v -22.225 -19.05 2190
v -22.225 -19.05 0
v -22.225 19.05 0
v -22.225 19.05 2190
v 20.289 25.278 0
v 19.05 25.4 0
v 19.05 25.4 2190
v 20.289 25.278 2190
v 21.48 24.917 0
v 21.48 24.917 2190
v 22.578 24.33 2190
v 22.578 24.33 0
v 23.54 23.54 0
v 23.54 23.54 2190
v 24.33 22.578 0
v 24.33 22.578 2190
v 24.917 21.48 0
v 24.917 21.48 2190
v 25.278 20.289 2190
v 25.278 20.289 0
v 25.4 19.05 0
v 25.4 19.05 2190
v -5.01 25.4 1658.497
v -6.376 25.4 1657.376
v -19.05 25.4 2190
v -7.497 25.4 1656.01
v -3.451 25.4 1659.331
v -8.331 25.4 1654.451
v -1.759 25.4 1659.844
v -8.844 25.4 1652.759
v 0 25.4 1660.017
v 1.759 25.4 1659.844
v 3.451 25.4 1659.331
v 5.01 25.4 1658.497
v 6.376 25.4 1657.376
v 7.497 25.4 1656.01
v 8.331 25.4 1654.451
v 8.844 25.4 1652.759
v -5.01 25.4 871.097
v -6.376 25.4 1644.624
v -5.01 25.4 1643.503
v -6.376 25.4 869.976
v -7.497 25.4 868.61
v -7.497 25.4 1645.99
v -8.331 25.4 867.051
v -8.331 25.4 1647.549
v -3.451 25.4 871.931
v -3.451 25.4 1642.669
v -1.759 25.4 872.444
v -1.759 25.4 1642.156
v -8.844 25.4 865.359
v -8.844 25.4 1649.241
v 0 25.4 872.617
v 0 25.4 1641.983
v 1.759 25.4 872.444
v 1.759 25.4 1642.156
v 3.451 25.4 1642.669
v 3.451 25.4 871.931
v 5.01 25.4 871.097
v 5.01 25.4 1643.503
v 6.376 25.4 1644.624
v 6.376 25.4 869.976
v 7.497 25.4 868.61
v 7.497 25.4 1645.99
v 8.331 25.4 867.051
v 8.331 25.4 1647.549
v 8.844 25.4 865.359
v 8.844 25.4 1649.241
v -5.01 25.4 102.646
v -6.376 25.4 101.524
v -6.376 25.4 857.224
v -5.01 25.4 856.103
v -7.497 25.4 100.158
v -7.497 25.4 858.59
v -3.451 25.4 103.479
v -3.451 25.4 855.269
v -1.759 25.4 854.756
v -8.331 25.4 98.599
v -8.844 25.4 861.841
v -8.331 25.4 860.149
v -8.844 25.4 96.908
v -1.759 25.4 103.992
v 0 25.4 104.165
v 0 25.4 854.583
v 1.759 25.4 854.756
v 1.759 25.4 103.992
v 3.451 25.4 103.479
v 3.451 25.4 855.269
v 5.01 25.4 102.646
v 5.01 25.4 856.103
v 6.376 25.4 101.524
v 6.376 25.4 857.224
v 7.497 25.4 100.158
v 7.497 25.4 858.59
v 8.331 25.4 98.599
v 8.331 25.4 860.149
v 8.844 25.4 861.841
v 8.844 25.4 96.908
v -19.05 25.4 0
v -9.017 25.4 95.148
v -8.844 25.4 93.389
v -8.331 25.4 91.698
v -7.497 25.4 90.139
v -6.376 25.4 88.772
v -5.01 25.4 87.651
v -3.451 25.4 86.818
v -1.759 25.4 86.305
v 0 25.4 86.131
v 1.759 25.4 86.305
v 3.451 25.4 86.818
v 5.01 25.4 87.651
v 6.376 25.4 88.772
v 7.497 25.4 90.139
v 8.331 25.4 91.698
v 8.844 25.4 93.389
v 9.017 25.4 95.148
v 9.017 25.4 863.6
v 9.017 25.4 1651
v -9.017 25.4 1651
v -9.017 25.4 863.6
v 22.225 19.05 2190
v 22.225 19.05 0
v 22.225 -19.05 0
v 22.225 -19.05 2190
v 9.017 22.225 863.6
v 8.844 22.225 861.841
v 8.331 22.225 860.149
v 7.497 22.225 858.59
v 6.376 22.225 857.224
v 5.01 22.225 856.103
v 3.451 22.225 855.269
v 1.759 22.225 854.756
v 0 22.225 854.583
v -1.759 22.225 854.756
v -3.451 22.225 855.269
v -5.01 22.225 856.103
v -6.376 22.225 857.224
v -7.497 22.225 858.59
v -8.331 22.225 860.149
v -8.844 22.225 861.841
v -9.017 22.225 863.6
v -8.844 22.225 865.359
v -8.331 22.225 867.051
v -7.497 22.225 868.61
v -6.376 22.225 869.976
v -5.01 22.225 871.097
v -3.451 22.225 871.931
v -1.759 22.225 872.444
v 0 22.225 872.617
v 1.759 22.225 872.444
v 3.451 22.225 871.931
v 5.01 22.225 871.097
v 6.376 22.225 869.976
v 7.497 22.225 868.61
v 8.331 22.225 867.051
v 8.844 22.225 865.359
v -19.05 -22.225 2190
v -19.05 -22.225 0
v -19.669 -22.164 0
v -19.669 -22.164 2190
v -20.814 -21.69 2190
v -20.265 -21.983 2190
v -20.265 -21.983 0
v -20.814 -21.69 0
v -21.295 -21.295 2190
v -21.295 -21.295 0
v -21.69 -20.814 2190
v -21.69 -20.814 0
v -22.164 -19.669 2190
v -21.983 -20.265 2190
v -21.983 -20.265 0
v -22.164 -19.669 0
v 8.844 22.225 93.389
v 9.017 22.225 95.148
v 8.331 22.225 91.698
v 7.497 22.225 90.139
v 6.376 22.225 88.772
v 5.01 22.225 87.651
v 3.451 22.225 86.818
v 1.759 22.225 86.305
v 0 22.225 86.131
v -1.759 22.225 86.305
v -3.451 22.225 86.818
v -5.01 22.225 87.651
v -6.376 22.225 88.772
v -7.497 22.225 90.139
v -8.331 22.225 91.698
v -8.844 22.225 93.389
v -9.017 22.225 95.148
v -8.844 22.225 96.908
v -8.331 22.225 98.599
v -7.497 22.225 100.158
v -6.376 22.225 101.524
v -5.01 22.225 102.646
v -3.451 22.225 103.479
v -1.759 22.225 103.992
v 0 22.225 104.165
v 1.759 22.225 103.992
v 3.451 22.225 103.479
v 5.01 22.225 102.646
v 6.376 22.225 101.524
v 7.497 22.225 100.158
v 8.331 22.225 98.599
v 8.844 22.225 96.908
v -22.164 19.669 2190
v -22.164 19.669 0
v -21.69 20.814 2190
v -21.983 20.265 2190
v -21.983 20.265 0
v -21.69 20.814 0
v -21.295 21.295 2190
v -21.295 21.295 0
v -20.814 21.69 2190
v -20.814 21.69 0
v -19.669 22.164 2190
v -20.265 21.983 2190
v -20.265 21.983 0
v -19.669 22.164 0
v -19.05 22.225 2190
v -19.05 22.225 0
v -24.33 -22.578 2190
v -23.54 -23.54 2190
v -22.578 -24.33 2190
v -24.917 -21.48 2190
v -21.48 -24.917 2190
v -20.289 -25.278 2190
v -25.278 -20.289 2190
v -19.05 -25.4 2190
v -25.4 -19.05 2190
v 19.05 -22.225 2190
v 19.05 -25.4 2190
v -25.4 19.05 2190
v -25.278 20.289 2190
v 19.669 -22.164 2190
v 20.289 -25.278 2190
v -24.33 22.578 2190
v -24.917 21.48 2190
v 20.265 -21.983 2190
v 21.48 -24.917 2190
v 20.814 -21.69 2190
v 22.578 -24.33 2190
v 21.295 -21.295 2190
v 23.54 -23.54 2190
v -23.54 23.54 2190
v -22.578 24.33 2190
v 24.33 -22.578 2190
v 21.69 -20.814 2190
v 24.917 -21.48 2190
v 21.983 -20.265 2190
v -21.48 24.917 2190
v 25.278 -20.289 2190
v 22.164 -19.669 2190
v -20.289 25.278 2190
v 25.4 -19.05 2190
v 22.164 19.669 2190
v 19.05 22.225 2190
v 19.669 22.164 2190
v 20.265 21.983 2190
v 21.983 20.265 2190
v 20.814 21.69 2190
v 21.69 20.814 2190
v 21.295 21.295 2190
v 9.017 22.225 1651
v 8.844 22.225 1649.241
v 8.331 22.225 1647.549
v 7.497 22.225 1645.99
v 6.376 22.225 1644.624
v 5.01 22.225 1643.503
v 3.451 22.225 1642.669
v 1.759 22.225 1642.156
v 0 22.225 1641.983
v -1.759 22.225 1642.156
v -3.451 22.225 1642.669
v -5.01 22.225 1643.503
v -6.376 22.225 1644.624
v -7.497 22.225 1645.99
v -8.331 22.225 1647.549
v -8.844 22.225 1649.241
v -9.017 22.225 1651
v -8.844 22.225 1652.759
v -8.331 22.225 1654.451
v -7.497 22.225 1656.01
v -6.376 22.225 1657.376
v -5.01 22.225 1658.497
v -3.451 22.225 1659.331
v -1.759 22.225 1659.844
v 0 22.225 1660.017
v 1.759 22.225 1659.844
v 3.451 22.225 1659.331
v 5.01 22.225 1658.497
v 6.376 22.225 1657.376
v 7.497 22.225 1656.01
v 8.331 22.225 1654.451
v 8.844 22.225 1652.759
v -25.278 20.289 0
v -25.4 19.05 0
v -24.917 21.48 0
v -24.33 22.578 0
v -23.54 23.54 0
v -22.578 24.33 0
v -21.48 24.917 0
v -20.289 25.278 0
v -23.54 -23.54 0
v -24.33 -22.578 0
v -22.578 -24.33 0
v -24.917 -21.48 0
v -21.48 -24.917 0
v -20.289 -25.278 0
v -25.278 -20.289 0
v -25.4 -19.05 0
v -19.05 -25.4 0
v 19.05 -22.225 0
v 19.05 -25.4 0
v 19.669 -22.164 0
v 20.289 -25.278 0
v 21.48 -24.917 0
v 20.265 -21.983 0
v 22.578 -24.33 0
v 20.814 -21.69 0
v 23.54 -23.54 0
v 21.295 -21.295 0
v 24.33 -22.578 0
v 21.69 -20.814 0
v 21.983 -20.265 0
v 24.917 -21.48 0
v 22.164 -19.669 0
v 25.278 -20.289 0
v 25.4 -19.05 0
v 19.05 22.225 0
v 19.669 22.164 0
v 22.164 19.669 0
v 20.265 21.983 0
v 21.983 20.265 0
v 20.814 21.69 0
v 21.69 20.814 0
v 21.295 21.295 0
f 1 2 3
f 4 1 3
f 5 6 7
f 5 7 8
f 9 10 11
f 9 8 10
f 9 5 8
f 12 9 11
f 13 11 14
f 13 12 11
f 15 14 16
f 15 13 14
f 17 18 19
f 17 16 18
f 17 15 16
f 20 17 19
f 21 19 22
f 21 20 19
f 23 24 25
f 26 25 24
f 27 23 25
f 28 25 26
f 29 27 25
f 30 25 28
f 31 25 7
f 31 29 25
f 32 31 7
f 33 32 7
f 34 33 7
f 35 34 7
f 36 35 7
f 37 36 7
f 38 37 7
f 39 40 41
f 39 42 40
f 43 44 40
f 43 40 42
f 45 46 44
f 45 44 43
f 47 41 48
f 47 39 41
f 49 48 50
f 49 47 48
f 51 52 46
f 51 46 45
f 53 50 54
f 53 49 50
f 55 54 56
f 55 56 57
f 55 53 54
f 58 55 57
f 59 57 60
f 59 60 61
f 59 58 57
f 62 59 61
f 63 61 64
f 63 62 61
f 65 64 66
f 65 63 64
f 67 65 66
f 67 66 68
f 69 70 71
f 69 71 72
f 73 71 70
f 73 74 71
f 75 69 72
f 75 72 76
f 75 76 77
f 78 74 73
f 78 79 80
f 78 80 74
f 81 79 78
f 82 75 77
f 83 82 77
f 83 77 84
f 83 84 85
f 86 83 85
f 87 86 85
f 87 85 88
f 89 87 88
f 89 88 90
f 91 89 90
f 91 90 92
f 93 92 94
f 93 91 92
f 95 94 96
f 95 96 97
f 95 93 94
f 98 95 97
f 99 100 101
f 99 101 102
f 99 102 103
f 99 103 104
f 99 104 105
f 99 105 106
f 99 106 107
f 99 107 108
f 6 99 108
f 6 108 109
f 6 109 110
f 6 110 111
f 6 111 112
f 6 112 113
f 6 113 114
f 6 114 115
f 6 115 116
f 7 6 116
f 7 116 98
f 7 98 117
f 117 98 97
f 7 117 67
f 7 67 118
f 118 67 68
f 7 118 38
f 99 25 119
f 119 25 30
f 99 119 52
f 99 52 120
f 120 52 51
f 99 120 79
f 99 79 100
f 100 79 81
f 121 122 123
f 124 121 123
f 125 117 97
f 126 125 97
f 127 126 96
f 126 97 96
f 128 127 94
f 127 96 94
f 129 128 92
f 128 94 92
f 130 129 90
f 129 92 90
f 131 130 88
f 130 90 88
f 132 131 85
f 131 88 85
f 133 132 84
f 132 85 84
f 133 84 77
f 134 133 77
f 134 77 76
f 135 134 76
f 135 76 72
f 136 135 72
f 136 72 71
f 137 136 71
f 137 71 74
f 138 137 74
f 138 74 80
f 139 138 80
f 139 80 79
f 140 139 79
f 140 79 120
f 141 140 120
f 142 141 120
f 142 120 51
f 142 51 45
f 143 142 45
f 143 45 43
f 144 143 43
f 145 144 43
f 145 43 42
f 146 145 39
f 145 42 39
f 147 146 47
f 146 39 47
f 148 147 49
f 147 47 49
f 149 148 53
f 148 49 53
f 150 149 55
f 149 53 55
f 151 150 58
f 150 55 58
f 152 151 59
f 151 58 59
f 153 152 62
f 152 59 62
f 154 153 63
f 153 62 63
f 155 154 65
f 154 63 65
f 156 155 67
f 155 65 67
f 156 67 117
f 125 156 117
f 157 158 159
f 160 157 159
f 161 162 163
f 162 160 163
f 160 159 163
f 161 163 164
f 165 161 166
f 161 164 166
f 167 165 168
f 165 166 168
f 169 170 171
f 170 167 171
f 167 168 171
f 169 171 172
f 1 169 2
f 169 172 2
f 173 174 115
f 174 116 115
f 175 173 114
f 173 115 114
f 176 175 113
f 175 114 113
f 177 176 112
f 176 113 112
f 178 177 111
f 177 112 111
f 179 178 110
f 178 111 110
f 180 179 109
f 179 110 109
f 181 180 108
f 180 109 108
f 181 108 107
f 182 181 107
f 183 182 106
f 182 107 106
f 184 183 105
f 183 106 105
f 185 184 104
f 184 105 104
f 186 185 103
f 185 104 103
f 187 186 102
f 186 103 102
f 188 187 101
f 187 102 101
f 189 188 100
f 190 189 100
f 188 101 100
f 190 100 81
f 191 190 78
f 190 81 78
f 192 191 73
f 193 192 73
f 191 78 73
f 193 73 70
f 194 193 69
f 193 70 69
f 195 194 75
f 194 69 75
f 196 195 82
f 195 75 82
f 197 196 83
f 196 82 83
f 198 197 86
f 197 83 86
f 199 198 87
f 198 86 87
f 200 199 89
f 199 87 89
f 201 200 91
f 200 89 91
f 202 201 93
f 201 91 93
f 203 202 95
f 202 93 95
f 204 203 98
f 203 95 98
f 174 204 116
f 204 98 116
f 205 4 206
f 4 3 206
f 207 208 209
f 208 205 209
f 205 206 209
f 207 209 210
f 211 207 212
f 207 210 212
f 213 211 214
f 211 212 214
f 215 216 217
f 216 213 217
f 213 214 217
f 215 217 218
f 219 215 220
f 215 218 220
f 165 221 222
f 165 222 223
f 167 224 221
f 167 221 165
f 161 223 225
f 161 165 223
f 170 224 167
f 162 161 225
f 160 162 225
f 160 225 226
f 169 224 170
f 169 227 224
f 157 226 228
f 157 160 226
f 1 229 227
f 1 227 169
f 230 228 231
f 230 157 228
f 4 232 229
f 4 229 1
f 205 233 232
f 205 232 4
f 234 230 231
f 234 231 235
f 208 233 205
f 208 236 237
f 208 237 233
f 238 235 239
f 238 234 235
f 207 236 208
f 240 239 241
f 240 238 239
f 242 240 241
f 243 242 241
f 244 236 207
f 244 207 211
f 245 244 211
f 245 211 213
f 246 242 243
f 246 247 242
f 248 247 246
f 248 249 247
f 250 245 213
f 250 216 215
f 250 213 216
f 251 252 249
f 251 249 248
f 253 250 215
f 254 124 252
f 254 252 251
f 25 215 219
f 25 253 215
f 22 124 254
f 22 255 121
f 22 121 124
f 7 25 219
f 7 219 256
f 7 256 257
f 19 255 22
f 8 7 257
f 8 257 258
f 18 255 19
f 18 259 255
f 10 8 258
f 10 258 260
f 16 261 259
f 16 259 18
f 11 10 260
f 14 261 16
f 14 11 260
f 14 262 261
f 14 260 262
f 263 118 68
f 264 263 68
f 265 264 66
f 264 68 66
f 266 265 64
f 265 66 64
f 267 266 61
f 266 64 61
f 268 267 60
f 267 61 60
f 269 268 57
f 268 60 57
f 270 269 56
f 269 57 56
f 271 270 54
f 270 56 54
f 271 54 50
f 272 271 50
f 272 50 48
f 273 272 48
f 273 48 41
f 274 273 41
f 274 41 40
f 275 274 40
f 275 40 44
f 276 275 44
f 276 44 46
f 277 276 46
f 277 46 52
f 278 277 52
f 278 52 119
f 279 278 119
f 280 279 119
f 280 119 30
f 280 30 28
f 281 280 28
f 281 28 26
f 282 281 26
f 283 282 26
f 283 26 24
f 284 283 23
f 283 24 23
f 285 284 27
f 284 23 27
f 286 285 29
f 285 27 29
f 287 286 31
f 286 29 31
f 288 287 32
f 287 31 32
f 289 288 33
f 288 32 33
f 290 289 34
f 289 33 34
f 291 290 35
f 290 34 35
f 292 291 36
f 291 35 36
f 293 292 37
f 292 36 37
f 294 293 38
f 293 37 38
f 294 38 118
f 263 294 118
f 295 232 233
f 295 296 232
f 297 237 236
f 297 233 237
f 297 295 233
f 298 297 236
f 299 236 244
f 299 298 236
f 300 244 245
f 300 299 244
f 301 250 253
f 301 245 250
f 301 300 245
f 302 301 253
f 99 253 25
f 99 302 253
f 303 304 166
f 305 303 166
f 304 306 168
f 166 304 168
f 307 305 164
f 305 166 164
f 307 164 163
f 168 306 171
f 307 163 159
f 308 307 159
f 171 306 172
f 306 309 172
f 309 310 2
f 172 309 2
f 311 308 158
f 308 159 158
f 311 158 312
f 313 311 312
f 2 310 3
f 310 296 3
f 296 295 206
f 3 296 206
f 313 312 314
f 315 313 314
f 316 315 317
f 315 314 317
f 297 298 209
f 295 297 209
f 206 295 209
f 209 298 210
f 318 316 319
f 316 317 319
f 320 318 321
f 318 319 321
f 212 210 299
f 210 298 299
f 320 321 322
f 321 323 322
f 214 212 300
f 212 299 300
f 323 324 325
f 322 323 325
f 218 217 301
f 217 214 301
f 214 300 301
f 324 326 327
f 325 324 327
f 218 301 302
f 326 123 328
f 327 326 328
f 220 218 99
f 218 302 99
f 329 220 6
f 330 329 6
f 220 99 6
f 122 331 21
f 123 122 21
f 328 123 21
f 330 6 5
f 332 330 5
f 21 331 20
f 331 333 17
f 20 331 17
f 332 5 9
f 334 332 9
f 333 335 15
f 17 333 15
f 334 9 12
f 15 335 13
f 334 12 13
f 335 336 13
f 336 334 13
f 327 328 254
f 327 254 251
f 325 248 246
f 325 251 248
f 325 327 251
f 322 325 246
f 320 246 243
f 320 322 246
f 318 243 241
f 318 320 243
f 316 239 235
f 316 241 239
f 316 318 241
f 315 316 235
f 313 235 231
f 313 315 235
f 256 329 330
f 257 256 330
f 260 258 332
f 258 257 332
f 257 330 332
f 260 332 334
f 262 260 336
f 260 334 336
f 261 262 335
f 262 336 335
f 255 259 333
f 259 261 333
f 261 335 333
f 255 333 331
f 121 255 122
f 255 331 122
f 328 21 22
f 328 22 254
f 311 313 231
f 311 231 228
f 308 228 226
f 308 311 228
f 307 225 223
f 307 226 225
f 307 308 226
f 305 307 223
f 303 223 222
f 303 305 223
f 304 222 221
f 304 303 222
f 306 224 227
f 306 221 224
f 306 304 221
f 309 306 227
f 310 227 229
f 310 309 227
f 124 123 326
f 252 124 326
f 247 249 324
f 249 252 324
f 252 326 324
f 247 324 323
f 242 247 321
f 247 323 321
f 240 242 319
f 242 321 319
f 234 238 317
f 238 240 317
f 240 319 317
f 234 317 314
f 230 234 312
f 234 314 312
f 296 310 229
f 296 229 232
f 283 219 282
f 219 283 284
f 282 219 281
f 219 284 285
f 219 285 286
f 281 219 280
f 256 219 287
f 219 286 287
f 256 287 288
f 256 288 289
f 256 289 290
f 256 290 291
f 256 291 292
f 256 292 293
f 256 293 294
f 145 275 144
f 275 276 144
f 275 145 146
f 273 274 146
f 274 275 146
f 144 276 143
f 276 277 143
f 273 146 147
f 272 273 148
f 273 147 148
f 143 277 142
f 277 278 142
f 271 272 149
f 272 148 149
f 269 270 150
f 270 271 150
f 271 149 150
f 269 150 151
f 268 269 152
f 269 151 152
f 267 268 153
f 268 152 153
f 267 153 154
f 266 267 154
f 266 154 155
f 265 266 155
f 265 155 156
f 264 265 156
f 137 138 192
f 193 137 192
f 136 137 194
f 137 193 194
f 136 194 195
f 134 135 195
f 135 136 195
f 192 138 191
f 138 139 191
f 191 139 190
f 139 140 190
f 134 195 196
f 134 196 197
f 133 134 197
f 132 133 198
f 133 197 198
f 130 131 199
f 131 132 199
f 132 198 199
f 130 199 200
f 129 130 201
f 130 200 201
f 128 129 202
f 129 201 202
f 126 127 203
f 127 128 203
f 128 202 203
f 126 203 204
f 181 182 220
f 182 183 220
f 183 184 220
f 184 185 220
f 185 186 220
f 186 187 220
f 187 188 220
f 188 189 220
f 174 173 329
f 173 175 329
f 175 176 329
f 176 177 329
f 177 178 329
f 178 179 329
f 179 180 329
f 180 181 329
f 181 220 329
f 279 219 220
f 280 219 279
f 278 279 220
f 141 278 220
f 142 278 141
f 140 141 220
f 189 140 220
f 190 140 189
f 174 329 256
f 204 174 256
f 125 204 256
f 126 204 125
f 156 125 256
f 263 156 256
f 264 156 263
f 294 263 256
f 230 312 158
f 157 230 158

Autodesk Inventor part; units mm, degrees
ref_plane "YZ Plane" through (0, 0, 0) normal (1, 0, 0) x (0, 1, 0)
ref_plane "Plano inicial" through (0, 0, 0) normal (0, 0, 1) x (1, 0, 0)
ref_plane "Plano final" through (0, 0, 2190) normal (0, 0, 1) x (1, 0, 0)
sketch "Boceto" plane through (0, 0, 0) normal (0, 0, 1) x (1, 0, 0)
  line L0 (-25.4, -19.05) -> (-25.4, 19.05)
  line L1 (-19.05, 25.4) -> (19.05, 25.4)
  line L2 (25.4, 19.05) -> (25.4, -19.05)
  line L3 (19.05, -25.4) -> (-19.05, -25.4)
  arc A0 (-25.4, -19.05) -> (-19.05, -25.4) centre (-19.05, -19.05) ccw
  arc A1 (-19.05, 25.4) -> (-25.4, 19.05) centre (-19.05, 19.05) ccw
  arc A2 (25.4, 19.05) -> (19.05, 25.4) centre (19.05, 19.05) ccw
  arc A3 (19.05, -25.4) -> (25.4, -19.05) centre (19.05, -19.05) ccw
  arc A4 (-19.05, 22.225) -> (-22.225, 19.05) centre (-19.05, 19.05) ccw
  line L4 (-19.05, 22.225) -> (19.05, 22.225)
  arc A5 (22.225, 19.05) -> (19.05, 22.225) centre (19.05, 19.05) ccw
  line L5 (22.225, 19.05) -> (22.225, -19.05)
  arc A6 (19.05, -22.225) -> (22.225, -19.05) centre (19.05, -19.05) ccw
  line L6 (19.05, -22.225) -> (-19.05, -22.225)
  arc A7 (-22.225, -19.05) -> (-19.05, -22.225) centre (-19.05, -19.05) ccw
  line L7 (-22.225, -19.05) -> (-22.225, 19.05)
  line L8 (0, 37.4012) -> (0, -37.4012) construction
  line L9 (-37.4012, 0) -> (37.4012, 0) construction
  dimension "d10" = 50.8
  dimension "d11" = 50.8
  dimension "d12" = 3.175
  dimension "d15" = 25.4
  dimension "d16" = 25.4
  dimension "d17" = 6.35
extrude "Cuerpo" add sketch "Boceto" along normal up to surface (2190 mm away) from surface at 0
sketch "Sketch3" plane through (0, 0, 0) normal (0, 0, 1) x (1, 0, 0)
  line L0 (0, 0) -> (10, 0)
ref_plane "Work Plane3" through (0, 0, 0) normal (0, -1, 0) x (1, 0, 0)
sketch "Boceto5" plane through (19.05, 25.4, 2190) normal (0, 1, 0) x (1, 0, 0)
  line L0 (-19.05, 2190) -> (-19.05, 0)
  line L1 (-38.1, 2190) -> (-38.1, 0) projected
  circle A0 centre (-19.05, 2094.8516) radius 9.017
  circle A1 centre (-19.05, 1326.4) radius 9.017
  circle A2 centre (-19.05, 539) radius 9.017
  line L2 (-38.1, 2190) -> (0, 2190) projected
  point P0 (-19.05, 2190)
  point P1 (-19.05, 2190)
  point P2 (-19.05, 2190)
  dimension "d20" = 18.034
  dimension "d21" = 18.034
  dimension "d22" = 18.034
  dimension "d23" = 1651
  dimension "d24" = 863.6
  dimension "d25" = 95.1484
extrude "Extrusión2" cut sketch "Boceto5" against normal blind 19.05
sketch "Sketch4" plane through (0, 0, 0) normal (0, -1, 0) x (1, 0, 0)
  line L0 (-2, 0) -> (12, 0) projected
  line L1 (-2, 2190) -> (12, 2190) projected
  dimension "d19" = 2190
equation "\"d10\" = G_H"
equation "\"d11\" = G_W"
equation "\"d12\" = G_T"
equation "\"d15\" = 0.5 * d10"
equation "\"d16\" = 0.5 * d11"
equation "\"d17\" = G_IR"
equation "\"d3\" = G_L"
equation "\"G_W\" = 50.8"
equation "\"G_H\" = 50.8"
equation "\"G_T\" = 3.175"
equation "\"G_IR\" = 6.35"
equation "\"G_L\" = d19"
equation "\"G_OFFSET_START\" = 0"
equation "\"G_OFFSET_END\" = 0"
equation "\"d14\" = G_OFFSET_END + B_L"
equation "\"B_L\" = 2190"
properties part number "AISC - 2 x 2 x 1/8 - 86,22" material "Acero, suave"
